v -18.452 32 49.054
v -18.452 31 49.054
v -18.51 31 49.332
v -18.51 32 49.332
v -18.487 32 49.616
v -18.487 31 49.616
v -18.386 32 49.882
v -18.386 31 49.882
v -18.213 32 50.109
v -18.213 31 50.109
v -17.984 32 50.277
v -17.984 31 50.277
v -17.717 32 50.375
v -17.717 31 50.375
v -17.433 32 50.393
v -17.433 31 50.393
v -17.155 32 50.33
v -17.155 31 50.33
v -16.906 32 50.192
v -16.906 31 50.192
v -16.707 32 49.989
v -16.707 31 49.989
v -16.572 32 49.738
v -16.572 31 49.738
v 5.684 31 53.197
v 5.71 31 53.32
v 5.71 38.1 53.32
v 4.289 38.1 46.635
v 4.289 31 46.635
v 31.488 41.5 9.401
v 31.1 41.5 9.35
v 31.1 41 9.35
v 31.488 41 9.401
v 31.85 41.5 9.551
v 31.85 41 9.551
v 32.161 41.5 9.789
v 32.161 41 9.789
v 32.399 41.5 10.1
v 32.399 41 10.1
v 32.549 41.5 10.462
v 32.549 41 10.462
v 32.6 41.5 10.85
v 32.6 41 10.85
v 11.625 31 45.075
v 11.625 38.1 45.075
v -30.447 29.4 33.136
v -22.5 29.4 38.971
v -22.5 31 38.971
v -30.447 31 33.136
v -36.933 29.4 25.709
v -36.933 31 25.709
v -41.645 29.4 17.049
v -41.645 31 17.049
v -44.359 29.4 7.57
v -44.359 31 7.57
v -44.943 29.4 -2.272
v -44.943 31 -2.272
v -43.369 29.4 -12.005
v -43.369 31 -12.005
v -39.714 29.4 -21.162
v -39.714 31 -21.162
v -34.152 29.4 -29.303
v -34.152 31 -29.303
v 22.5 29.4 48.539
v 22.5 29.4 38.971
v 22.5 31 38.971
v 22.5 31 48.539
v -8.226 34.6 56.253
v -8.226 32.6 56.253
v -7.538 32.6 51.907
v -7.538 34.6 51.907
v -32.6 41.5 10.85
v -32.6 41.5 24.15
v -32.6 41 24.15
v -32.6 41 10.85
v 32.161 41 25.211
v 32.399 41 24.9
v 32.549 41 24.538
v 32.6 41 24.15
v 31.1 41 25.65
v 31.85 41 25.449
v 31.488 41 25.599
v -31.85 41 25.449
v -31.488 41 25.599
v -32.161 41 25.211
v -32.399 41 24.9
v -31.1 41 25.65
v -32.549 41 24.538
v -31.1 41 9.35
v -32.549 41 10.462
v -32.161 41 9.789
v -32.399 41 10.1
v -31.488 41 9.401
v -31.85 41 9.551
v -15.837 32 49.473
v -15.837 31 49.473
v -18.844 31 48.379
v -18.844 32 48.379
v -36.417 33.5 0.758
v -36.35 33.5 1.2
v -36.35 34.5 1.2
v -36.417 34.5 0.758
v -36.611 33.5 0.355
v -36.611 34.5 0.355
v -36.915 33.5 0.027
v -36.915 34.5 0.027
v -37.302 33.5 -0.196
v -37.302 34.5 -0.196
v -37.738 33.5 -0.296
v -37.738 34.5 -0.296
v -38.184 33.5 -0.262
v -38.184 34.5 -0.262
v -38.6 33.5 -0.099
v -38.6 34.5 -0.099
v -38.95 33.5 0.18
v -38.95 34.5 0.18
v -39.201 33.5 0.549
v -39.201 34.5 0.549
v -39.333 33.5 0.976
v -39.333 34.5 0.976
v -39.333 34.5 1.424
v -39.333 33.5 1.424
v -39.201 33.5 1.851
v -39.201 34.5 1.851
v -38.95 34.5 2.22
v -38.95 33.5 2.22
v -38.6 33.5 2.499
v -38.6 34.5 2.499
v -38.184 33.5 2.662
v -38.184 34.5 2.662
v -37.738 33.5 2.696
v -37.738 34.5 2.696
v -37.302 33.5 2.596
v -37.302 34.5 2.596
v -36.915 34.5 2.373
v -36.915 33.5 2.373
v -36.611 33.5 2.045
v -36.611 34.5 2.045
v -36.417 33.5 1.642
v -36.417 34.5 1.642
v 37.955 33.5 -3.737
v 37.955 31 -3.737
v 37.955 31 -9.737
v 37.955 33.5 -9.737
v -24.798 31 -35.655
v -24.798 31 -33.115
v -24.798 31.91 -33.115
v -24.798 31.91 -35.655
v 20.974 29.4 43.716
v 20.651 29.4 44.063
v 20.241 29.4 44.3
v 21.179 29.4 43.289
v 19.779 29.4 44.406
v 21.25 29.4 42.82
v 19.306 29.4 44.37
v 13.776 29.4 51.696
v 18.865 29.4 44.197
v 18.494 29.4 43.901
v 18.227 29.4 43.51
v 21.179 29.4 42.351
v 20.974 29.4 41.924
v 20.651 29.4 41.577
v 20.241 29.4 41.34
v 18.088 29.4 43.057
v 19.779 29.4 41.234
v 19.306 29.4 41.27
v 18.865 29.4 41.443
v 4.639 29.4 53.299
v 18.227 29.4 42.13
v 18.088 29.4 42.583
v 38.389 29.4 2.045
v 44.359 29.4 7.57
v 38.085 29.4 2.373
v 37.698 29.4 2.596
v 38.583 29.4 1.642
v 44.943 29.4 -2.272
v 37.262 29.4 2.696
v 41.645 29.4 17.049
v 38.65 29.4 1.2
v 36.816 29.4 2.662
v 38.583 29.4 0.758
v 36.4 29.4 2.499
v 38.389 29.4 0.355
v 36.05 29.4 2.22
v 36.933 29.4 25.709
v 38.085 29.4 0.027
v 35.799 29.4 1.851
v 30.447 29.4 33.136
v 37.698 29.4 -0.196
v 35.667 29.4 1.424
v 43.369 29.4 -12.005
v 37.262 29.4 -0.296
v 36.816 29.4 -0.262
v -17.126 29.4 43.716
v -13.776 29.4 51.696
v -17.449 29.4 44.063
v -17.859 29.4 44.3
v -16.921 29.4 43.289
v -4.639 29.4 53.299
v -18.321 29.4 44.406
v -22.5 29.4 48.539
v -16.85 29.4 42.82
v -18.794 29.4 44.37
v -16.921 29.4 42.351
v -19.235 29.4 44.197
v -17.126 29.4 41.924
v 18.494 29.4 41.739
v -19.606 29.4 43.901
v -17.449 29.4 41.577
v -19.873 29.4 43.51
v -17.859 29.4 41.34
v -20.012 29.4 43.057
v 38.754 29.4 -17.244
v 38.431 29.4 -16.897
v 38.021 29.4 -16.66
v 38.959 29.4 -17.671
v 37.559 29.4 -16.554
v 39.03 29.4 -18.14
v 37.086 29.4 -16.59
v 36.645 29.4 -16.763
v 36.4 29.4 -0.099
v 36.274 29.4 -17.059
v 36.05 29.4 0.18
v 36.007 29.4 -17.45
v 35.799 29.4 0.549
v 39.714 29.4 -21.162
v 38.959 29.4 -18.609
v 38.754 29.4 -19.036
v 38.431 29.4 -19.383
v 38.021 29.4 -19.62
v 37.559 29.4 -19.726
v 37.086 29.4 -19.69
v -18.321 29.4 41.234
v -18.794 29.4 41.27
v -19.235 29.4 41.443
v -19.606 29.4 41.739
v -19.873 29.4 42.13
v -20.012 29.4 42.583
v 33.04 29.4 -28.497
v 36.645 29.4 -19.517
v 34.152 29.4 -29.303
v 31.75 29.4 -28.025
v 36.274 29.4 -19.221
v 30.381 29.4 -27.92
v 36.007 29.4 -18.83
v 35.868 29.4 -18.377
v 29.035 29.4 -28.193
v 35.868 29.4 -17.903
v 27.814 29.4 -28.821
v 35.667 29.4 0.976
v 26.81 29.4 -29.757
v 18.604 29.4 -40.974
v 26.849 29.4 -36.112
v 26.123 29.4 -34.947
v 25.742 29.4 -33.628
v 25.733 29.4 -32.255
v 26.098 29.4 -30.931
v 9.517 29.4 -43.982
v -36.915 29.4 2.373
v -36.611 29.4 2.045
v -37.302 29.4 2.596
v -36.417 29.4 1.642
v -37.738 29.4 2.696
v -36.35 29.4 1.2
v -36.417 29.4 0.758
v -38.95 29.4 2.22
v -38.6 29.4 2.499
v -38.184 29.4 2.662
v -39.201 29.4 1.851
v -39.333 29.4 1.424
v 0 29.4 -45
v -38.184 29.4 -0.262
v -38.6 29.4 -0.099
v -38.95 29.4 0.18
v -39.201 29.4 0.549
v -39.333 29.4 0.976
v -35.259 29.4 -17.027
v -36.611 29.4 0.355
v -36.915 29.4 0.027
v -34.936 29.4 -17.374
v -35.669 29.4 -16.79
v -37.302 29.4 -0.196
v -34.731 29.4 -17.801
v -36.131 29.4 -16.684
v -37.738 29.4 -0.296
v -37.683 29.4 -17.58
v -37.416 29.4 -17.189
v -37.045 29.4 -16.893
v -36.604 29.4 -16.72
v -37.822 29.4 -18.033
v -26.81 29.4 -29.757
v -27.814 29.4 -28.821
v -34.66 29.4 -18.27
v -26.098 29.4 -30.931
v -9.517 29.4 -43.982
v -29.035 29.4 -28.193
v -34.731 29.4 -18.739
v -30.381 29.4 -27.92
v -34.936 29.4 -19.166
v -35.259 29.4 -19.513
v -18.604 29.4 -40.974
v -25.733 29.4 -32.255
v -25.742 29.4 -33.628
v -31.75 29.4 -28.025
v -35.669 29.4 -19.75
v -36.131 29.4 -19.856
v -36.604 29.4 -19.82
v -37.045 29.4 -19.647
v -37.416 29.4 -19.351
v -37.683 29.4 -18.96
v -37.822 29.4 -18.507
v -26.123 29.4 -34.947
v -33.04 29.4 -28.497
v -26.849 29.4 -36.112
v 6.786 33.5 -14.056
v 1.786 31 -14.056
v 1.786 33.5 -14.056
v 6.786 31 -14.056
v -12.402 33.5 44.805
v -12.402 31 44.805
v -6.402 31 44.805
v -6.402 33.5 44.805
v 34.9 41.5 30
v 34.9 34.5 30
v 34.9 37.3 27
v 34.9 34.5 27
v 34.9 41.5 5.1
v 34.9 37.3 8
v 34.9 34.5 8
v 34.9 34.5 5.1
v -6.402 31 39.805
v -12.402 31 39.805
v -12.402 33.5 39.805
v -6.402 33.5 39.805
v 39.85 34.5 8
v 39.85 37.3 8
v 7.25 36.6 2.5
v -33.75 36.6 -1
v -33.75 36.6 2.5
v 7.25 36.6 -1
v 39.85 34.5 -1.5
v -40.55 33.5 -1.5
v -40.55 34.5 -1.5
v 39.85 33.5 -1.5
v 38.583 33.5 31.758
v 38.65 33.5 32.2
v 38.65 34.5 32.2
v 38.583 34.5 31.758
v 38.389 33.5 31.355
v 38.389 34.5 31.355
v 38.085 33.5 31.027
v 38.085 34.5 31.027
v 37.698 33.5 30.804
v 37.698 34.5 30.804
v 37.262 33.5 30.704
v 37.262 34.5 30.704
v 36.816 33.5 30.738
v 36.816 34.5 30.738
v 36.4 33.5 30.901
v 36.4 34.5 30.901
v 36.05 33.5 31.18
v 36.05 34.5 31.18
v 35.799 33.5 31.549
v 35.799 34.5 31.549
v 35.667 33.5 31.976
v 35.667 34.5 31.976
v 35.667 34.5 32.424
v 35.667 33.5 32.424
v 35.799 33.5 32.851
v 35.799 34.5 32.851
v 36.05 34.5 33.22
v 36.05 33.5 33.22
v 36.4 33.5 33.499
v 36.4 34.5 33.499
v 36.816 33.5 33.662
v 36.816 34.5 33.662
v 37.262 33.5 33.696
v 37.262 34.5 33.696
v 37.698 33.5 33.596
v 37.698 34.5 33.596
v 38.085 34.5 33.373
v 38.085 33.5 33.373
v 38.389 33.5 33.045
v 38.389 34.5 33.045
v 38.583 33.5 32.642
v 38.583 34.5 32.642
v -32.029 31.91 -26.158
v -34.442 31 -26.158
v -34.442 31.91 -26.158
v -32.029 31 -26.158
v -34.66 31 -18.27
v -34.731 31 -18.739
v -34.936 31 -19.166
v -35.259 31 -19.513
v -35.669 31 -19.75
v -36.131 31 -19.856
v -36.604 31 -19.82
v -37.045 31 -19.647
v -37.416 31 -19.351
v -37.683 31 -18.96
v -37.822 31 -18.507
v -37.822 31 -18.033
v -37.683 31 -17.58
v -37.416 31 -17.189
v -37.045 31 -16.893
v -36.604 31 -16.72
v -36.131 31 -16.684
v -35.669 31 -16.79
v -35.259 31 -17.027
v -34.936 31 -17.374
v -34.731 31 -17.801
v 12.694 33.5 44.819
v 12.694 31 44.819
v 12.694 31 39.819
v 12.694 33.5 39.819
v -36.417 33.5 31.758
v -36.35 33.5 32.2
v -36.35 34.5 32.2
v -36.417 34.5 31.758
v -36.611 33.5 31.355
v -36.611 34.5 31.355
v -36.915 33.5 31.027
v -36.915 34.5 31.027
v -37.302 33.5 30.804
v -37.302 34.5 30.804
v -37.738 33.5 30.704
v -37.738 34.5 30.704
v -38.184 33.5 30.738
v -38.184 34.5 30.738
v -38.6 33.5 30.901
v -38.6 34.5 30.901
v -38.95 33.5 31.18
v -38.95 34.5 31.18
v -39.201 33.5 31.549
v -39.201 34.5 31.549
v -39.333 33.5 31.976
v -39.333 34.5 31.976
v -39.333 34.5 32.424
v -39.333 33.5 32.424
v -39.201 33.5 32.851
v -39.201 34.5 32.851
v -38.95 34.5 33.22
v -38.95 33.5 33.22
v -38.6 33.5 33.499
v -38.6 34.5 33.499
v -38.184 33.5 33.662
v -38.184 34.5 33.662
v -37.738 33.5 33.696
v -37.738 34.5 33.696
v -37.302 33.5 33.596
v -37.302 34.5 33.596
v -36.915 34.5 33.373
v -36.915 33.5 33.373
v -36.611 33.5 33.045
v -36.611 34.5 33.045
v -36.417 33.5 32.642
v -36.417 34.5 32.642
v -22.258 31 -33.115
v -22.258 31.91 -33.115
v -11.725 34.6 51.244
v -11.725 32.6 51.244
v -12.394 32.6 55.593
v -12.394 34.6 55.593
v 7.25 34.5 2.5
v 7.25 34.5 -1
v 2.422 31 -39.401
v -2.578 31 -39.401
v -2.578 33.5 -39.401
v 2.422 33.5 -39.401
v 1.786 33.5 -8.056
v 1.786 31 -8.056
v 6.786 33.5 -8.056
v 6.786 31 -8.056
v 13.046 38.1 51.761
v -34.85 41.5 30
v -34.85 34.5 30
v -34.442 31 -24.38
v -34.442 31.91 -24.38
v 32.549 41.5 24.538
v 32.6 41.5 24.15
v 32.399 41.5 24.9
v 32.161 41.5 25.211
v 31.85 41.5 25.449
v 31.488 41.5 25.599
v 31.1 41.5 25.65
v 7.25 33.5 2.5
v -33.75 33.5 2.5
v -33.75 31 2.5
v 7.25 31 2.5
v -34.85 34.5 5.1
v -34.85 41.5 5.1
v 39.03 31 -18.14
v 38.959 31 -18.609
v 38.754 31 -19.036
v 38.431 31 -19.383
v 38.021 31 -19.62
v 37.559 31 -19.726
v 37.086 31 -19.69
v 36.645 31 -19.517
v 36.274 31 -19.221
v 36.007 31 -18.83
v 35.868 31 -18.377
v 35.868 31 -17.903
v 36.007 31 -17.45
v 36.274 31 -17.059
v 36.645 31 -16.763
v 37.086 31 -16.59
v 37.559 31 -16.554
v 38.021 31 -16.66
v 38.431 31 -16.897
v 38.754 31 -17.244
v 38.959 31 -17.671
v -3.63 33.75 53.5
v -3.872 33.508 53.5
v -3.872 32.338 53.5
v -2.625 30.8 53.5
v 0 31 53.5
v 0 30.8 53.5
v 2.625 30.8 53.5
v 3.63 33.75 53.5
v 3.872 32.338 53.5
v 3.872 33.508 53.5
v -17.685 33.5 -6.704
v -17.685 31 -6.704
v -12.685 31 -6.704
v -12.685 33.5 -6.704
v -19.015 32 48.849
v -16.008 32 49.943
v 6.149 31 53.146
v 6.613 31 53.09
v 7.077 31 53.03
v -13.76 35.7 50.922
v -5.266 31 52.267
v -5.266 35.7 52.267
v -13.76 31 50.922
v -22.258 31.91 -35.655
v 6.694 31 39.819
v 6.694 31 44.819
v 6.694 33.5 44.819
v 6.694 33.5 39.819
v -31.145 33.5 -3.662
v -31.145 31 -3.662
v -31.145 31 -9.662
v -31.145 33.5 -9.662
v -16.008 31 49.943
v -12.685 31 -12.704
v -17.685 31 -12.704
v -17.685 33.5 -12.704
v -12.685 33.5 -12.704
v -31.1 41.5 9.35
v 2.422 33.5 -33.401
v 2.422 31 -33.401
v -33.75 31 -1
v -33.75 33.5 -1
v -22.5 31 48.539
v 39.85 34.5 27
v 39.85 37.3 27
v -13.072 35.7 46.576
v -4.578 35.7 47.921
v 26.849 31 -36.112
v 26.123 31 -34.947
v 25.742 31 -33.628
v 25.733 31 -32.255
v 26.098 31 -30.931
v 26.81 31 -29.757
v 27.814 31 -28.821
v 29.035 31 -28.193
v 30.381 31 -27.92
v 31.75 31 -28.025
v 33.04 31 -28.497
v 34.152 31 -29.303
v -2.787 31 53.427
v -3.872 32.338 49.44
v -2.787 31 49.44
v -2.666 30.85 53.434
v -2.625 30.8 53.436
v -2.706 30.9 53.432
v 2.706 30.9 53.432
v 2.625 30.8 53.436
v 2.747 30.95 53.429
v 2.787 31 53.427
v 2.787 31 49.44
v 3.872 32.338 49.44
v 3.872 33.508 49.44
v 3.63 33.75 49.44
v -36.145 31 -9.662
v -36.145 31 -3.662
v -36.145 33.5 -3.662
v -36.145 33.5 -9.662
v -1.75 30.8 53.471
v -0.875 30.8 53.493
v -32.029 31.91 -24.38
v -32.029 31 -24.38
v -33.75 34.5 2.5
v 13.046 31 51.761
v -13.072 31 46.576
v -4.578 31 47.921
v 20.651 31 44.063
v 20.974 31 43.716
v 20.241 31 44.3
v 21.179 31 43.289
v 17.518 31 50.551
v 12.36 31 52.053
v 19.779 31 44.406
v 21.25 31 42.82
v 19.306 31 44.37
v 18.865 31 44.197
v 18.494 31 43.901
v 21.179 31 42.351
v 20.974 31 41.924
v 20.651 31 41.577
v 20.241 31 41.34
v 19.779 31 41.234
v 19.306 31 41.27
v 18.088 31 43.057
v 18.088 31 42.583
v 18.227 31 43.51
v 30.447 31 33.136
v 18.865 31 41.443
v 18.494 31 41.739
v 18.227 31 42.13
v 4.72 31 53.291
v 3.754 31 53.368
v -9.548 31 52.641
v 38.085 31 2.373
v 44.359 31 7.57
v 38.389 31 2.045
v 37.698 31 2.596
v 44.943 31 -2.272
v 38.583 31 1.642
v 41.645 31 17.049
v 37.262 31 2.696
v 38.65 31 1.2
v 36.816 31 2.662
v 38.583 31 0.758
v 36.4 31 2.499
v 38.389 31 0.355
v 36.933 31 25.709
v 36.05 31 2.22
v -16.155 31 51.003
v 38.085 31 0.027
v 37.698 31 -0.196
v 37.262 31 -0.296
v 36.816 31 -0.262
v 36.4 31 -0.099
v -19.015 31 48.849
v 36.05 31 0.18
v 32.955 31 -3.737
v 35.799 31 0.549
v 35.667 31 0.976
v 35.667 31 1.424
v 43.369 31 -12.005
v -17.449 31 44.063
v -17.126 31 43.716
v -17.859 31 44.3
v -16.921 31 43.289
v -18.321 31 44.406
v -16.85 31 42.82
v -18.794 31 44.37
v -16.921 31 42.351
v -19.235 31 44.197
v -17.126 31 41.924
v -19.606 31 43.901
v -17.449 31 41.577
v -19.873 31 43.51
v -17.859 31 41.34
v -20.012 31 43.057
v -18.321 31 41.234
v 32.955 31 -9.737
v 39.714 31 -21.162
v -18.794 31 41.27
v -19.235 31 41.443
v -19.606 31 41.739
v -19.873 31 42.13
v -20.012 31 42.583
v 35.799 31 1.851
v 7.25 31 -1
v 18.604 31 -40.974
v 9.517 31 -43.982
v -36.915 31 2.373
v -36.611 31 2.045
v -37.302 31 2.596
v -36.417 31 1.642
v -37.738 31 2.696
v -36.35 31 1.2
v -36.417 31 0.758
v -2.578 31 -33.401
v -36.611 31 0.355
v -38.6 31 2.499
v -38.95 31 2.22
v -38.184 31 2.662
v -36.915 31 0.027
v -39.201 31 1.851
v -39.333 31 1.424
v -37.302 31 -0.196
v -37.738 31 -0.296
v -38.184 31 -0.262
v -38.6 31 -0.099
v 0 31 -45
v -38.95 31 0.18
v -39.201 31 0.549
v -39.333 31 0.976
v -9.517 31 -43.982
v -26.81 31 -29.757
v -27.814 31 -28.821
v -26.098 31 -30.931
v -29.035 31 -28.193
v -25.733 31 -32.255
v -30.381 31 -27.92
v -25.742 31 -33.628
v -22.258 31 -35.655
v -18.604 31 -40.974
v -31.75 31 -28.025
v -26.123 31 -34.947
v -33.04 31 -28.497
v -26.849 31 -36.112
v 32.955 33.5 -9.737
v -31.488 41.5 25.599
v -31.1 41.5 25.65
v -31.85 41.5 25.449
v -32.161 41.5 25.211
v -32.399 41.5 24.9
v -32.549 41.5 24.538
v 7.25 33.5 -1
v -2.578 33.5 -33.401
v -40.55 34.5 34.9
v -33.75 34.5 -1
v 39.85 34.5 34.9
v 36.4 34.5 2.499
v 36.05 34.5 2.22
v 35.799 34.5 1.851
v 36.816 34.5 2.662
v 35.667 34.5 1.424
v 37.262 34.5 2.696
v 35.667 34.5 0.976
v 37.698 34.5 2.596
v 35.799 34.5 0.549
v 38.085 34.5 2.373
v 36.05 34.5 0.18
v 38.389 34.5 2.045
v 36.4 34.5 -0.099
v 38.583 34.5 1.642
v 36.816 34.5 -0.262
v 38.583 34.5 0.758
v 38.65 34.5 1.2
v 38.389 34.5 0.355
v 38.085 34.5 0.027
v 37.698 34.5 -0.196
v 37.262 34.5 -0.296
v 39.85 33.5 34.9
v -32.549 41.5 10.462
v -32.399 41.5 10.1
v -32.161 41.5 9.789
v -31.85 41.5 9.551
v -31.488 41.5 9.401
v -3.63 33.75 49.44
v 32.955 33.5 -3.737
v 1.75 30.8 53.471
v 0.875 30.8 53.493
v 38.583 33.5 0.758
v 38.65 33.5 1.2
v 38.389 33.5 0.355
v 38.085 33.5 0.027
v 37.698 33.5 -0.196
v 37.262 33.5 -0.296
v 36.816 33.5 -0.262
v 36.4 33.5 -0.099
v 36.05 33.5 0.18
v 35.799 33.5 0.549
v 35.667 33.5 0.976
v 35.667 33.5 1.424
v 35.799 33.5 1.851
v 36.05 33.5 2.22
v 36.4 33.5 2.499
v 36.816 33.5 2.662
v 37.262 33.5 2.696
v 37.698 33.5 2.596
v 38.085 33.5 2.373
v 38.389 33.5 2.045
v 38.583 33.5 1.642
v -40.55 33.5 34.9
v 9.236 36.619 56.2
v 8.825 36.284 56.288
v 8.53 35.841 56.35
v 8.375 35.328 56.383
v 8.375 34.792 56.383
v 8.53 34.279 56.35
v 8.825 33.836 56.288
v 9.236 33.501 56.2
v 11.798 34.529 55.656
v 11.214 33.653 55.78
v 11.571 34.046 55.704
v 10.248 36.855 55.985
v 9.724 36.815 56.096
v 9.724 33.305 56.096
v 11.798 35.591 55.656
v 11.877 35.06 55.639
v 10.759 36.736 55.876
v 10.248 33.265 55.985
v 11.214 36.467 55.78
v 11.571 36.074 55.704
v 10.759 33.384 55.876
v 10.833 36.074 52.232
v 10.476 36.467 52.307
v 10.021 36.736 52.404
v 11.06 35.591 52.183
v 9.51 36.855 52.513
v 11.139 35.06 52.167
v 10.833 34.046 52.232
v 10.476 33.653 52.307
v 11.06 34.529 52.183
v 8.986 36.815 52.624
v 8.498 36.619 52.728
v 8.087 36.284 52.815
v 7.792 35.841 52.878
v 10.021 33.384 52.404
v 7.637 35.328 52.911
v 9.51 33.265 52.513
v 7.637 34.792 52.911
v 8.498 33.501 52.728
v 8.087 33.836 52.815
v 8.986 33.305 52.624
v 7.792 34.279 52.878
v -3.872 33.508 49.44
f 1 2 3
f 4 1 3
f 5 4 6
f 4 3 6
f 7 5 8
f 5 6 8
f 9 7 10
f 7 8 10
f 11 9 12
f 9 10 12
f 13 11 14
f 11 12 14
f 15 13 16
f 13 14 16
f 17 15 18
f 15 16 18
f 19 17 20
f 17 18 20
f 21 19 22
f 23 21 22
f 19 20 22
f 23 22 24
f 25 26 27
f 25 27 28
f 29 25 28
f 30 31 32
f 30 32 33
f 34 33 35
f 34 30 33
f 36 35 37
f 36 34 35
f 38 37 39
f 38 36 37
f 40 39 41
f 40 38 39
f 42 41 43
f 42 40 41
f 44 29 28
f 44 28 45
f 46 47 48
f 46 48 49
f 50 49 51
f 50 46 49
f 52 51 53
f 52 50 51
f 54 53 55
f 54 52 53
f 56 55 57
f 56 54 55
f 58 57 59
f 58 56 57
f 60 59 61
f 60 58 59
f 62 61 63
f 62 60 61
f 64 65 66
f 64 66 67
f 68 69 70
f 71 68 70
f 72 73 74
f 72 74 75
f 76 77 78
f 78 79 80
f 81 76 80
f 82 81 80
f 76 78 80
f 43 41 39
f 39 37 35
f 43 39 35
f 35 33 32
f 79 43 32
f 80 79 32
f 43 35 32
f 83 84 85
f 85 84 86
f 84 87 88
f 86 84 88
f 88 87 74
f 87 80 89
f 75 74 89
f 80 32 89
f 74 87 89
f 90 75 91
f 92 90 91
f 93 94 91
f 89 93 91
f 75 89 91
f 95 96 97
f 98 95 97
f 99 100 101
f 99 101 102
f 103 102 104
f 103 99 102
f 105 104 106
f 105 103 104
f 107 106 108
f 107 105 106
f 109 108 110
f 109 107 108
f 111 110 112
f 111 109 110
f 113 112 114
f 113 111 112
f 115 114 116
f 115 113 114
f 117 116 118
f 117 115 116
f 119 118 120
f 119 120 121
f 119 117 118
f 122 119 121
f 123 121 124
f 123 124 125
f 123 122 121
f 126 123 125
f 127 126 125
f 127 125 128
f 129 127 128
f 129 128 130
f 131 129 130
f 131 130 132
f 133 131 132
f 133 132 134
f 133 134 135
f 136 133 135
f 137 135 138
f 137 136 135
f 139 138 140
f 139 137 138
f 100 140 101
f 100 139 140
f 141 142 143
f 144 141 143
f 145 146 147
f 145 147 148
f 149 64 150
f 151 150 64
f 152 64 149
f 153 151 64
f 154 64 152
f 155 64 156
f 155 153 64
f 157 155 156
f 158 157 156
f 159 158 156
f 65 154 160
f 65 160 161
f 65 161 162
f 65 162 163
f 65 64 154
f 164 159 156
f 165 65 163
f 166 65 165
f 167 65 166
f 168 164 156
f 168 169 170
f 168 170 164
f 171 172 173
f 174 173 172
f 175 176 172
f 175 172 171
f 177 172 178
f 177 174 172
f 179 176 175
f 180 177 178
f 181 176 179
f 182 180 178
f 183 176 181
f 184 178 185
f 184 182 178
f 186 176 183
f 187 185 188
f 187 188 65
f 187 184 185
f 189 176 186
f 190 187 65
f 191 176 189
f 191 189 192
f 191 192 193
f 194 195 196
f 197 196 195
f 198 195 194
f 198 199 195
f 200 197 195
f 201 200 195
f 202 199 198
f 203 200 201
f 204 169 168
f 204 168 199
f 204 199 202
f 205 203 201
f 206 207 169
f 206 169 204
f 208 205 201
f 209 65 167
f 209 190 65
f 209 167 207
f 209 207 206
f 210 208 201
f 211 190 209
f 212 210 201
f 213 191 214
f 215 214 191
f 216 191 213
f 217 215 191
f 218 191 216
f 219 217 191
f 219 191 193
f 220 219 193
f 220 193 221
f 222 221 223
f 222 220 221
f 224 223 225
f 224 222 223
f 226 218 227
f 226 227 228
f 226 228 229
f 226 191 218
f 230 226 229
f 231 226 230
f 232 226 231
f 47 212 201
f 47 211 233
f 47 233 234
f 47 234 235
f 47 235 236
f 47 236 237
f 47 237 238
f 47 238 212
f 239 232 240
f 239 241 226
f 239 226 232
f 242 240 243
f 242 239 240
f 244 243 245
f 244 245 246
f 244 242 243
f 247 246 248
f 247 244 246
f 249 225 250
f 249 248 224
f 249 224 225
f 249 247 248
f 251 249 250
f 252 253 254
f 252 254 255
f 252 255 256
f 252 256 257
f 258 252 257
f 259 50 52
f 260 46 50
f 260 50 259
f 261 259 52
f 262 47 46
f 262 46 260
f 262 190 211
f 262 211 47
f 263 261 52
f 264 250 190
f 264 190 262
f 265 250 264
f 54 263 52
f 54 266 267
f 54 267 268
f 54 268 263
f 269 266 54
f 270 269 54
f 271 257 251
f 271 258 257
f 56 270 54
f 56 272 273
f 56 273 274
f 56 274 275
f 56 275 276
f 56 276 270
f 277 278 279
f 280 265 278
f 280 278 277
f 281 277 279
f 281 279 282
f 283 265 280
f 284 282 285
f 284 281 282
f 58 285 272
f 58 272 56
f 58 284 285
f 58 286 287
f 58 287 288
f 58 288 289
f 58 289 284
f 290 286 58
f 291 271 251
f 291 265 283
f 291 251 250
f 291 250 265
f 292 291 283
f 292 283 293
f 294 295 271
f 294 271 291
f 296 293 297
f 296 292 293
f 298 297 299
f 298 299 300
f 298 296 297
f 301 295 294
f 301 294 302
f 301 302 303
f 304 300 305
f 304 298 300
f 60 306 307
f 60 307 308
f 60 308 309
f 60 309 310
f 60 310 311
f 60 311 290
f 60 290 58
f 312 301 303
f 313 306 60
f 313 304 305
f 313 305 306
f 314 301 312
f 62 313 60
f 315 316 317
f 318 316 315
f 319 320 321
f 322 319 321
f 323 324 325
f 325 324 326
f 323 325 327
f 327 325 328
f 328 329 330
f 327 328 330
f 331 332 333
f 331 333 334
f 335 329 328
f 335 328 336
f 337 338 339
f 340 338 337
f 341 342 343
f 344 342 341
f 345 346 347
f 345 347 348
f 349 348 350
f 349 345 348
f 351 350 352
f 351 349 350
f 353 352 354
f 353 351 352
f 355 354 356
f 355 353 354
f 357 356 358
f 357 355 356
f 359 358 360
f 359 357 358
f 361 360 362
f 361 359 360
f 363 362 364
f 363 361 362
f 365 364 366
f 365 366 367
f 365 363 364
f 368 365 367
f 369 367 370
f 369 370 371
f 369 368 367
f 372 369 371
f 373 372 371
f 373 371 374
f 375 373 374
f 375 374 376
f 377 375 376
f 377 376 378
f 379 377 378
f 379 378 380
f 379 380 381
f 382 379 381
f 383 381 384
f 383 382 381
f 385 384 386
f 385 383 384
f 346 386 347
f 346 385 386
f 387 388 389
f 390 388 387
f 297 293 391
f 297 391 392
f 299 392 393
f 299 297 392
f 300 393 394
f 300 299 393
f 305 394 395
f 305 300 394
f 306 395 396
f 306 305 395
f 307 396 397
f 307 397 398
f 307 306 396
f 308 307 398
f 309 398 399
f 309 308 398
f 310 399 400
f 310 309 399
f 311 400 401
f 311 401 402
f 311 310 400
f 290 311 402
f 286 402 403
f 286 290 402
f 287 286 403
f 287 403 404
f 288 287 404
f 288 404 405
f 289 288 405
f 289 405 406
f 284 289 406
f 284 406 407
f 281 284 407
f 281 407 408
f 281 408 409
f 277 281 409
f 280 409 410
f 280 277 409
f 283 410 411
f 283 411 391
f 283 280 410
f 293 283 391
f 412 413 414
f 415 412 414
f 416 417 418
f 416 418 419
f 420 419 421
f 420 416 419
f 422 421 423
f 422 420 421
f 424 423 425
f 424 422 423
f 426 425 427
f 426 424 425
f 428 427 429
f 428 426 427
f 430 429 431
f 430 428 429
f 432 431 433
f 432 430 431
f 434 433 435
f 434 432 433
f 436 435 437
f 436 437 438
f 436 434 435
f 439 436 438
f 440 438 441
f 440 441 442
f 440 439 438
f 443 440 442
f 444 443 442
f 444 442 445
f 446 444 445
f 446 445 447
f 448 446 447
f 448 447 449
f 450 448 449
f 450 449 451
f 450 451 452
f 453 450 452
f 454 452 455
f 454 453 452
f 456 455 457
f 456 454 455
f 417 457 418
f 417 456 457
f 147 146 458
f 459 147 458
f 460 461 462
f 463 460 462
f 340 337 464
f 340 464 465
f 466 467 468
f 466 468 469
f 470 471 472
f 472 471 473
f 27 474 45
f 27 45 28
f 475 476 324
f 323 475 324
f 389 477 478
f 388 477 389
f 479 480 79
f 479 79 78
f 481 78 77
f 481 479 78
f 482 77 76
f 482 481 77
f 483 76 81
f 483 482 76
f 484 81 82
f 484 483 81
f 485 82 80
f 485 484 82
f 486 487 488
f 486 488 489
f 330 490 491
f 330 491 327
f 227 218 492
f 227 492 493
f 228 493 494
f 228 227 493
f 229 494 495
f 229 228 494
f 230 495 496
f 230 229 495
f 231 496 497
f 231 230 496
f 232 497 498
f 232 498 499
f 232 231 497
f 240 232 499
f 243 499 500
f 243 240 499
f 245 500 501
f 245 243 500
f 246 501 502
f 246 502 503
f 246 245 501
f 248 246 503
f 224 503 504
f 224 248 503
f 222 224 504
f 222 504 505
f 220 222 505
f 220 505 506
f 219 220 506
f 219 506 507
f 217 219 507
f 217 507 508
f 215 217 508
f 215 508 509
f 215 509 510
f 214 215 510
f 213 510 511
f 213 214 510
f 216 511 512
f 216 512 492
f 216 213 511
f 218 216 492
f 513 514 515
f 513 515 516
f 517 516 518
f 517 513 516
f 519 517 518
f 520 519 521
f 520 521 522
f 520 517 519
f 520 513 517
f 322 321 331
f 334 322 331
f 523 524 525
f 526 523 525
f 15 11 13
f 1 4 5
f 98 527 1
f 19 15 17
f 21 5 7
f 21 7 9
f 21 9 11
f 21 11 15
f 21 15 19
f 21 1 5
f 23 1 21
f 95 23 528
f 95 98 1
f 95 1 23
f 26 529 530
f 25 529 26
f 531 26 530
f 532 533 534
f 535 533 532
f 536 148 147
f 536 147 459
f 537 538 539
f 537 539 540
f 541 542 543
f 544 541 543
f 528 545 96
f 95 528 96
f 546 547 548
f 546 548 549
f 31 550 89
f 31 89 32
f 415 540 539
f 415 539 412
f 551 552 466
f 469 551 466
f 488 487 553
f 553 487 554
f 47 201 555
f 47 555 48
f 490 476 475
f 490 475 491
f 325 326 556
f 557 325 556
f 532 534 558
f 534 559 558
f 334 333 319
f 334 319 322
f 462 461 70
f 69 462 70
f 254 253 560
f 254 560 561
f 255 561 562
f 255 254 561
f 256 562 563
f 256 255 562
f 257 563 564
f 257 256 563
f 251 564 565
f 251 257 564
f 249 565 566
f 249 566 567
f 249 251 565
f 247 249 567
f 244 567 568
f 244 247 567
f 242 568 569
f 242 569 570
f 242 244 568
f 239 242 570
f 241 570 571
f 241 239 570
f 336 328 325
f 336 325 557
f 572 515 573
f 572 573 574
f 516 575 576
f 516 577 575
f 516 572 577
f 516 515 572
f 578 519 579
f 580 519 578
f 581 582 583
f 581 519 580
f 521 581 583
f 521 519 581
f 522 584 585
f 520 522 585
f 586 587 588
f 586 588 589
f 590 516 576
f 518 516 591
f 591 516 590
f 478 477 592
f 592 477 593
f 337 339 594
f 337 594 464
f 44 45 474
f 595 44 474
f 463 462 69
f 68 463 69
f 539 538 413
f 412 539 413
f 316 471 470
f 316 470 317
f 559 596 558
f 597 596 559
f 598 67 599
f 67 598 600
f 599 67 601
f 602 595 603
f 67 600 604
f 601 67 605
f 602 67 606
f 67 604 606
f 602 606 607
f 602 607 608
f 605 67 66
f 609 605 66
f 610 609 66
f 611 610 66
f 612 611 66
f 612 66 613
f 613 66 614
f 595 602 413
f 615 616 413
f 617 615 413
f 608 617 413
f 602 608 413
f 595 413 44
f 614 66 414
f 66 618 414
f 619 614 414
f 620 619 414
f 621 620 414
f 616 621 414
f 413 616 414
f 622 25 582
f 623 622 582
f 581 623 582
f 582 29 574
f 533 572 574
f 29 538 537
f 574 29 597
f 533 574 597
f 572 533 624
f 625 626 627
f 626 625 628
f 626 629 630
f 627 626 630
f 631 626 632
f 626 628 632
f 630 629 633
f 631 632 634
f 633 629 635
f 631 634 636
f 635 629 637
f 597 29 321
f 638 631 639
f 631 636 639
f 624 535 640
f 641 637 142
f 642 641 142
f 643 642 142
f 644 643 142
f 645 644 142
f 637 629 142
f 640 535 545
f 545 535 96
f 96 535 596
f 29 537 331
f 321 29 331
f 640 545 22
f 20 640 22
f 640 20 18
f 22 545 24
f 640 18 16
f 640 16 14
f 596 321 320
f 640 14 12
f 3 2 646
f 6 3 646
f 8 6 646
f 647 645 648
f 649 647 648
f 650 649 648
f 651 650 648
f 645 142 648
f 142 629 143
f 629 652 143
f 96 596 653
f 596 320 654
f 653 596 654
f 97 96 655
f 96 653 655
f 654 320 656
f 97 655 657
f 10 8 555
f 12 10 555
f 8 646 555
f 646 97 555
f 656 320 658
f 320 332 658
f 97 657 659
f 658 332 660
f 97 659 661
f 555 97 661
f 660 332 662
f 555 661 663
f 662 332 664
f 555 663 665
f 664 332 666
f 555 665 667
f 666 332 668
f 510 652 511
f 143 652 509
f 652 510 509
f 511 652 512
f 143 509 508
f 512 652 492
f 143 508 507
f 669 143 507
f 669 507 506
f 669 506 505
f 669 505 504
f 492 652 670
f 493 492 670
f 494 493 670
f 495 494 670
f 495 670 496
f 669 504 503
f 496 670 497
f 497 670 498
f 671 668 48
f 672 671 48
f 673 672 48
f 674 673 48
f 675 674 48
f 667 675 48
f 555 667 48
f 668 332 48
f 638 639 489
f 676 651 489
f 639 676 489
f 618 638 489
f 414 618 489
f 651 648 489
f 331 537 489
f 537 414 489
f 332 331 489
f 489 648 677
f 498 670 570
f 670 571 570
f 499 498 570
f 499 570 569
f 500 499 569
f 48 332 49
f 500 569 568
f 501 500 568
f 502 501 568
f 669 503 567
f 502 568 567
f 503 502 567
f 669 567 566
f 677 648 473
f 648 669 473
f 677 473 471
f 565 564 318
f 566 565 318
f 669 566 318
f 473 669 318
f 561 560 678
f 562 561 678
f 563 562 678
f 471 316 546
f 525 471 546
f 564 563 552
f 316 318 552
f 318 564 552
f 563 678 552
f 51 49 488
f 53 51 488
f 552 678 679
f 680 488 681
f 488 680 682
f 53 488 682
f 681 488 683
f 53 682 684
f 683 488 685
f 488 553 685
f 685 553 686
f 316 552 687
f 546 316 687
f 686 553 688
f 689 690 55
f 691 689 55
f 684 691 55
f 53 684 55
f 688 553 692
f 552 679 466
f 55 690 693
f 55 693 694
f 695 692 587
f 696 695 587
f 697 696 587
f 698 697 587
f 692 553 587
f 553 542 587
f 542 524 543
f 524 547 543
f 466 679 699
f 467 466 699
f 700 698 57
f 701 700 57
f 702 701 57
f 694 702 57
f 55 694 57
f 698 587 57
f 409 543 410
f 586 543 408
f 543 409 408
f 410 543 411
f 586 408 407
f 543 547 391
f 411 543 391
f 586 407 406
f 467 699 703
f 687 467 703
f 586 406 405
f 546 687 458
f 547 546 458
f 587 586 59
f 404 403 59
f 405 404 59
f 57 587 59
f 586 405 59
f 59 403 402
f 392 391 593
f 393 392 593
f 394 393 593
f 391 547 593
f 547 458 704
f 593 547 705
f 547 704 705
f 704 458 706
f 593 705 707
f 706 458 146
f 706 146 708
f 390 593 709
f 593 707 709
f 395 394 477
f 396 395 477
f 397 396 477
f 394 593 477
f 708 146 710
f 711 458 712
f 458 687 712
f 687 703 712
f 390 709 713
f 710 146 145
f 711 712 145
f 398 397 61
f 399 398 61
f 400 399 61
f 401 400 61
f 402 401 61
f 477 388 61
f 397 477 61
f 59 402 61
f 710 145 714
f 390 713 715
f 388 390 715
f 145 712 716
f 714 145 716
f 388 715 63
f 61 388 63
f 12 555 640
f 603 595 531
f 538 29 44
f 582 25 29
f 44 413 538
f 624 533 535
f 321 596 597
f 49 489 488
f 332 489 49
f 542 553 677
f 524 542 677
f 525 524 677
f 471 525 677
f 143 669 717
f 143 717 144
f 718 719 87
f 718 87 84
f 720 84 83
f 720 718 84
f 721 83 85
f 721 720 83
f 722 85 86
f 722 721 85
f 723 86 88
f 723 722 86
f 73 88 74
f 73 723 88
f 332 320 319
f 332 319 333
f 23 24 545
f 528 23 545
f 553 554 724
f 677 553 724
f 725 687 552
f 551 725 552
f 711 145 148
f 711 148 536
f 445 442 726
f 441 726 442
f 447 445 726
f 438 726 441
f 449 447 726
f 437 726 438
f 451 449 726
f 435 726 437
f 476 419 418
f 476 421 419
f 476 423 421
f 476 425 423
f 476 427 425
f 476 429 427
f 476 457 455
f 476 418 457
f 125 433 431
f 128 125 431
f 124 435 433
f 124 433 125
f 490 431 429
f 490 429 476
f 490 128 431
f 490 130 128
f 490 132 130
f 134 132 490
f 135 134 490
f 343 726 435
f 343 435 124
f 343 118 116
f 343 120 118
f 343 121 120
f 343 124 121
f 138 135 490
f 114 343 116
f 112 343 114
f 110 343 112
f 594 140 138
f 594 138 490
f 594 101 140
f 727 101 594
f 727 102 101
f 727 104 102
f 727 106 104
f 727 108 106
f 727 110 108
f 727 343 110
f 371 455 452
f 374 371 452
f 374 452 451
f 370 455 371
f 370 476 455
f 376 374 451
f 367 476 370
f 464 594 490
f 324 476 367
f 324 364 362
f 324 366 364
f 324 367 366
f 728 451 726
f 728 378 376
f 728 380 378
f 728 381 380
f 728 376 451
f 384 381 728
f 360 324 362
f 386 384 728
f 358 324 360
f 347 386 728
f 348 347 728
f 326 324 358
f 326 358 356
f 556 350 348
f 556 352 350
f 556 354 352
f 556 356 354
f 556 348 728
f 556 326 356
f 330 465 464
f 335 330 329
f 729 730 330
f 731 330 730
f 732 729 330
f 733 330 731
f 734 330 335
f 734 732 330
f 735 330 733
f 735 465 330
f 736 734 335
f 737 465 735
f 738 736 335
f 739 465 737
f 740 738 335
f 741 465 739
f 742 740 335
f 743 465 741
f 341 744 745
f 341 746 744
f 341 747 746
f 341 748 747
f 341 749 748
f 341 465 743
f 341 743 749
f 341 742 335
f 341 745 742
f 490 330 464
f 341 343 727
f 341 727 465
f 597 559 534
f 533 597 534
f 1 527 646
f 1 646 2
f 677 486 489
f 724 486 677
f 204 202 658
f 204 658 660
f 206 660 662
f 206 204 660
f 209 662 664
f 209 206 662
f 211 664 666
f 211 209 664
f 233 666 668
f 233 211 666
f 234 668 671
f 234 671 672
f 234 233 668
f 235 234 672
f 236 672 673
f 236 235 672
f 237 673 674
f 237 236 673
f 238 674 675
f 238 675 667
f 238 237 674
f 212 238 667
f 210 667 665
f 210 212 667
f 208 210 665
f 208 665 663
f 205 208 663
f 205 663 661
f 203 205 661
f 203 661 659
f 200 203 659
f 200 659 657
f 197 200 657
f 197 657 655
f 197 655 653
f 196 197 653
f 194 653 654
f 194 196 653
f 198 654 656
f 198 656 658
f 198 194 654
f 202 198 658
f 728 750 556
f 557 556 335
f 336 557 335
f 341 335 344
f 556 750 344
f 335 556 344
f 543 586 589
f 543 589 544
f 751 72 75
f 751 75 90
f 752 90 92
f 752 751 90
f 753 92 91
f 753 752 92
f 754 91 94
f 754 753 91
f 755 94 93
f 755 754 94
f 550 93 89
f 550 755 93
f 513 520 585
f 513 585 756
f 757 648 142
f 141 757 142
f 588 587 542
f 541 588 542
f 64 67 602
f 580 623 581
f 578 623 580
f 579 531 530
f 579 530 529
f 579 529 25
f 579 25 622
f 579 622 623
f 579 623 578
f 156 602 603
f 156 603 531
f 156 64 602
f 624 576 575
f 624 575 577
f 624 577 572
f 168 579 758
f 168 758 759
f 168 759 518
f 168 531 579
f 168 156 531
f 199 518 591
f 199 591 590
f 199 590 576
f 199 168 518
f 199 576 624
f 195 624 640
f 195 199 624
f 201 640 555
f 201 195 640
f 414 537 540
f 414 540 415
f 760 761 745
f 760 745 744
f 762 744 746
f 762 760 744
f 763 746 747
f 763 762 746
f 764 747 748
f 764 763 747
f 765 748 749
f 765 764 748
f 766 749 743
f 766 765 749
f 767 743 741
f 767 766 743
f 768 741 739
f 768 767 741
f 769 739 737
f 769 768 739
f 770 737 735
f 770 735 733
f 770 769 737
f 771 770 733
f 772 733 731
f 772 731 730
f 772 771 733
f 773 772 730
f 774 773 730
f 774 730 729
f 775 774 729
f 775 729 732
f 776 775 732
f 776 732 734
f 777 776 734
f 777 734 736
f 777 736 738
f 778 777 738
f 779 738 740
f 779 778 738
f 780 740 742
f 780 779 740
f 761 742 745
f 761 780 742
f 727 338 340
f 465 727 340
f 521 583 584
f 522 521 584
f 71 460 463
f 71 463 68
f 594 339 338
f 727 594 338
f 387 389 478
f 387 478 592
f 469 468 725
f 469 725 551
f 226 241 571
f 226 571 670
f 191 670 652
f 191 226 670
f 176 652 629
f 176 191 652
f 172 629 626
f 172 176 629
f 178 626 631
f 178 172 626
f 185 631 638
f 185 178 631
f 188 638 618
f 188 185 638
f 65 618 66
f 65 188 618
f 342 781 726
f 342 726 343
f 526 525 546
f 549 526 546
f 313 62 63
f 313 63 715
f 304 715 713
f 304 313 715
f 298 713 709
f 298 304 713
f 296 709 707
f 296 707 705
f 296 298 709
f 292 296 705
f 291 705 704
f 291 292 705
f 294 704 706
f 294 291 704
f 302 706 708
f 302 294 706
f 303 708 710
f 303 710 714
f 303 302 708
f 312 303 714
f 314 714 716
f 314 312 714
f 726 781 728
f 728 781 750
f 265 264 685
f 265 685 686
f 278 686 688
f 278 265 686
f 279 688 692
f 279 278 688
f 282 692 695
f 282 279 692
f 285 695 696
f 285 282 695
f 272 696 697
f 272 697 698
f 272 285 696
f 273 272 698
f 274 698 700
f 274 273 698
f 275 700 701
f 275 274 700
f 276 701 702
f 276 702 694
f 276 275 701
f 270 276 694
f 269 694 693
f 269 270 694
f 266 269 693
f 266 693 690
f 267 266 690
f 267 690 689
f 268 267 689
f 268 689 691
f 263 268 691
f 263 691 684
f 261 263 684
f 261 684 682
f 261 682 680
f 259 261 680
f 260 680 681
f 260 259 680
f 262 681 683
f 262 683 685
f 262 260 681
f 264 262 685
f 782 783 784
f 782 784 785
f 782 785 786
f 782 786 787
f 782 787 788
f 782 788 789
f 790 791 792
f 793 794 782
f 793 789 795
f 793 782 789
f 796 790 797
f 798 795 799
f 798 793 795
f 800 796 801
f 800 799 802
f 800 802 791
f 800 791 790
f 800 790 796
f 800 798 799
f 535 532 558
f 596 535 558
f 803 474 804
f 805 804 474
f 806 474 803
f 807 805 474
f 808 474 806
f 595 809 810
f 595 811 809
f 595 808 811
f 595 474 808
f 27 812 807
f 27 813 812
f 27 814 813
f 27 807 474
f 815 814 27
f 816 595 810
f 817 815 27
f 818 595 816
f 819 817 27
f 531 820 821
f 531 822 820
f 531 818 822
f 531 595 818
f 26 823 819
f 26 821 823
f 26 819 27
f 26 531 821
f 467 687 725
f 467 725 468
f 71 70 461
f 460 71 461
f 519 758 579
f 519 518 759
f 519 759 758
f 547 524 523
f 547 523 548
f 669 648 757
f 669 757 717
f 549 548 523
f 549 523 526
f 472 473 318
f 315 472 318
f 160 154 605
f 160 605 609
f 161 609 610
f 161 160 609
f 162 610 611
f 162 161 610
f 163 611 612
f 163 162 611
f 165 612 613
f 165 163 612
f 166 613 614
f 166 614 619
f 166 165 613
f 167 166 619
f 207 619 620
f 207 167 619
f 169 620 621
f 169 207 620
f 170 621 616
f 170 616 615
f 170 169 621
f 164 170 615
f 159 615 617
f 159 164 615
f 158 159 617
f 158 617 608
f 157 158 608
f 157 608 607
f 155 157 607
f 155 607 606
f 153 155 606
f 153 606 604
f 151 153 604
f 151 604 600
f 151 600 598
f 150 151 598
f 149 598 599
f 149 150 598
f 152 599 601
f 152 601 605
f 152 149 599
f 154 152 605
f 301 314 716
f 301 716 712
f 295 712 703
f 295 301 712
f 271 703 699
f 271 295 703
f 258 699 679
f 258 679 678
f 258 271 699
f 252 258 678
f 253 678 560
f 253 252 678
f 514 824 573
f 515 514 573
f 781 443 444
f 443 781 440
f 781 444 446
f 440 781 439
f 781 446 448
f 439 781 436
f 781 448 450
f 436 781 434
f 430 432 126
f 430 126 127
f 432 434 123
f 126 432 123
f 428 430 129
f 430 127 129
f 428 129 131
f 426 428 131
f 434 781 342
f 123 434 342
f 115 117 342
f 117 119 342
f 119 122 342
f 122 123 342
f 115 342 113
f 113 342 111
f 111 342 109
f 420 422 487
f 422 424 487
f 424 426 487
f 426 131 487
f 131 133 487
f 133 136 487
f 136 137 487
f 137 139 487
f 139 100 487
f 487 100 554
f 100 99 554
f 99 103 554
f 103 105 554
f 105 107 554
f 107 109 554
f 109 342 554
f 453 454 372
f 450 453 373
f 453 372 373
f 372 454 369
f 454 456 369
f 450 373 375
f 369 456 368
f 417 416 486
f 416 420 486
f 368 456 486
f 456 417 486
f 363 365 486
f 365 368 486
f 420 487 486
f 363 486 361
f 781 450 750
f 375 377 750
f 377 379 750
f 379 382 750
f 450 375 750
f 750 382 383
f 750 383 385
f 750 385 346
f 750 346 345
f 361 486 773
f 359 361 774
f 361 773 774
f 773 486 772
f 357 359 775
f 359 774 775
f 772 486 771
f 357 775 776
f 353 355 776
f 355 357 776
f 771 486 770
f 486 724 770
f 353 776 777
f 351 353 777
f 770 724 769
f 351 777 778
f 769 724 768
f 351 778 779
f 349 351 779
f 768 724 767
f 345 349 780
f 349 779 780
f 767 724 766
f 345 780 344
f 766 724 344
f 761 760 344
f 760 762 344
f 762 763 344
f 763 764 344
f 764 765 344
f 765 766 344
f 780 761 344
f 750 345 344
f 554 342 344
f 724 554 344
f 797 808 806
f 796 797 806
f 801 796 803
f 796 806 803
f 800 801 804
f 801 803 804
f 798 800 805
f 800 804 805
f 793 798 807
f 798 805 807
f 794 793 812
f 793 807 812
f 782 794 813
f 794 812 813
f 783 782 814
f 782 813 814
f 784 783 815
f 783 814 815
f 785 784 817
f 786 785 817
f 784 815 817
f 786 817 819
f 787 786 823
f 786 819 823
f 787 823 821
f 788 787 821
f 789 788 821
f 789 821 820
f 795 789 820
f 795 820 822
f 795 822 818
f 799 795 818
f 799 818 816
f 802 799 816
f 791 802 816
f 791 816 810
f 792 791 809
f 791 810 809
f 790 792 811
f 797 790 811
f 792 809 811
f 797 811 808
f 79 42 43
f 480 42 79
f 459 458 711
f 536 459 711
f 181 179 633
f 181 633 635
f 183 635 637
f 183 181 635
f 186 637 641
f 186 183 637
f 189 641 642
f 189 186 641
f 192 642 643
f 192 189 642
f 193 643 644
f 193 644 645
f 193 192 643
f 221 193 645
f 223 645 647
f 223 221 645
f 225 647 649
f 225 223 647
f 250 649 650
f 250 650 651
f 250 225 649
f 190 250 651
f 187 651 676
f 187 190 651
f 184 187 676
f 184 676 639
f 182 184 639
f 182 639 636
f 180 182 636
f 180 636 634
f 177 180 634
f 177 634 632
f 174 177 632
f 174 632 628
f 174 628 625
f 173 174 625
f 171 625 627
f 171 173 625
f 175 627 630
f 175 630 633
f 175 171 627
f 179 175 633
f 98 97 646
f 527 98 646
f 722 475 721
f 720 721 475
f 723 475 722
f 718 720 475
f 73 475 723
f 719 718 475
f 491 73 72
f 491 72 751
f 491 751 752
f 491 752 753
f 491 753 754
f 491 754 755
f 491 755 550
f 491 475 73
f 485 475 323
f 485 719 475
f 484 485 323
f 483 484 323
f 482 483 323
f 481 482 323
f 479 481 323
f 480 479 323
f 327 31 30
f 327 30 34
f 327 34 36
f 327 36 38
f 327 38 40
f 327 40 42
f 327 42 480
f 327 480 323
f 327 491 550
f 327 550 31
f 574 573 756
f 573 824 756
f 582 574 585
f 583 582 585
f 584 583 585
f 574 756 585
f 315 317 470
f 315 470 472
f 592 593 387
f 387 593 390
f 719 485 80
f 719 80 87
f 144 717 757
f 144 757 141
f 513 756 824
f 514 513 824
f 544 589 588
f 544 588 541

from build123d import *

# Parameters (mm, degrees)
BOSS_EXTRUDE_START                   = 29.4
PCB_AREA_R                           = 1.5
PCB_AREA_R_2                         = 1.59
BOSS_EXTRUDE_PCB_DEPTH               = 1.6
BOSS_EXTRUDE_START_2                 = 33.5
LCD_AREA_W                           = 80.4
LCD_AREA_H                           = 36.4
LCD_AREA_R                           = 1.5
BOSS_EXTRUDE_LCD_PCB_DEPTH           = 1
BOSS_EXTRUDE_START_3                 = 36.6
LCD_AREA_3_W                         = 41
LCD_AREA_3_H                         = 3.5
BOSS_EXTRUDE_LCD_HEADER_DEPTH        = 5.6
BOSS_EXTRUDE_START_4                 = 34.5
LCD_AREA_4_W                         = 4.95
LCD_AREA_4_H                         = 19
BOSS_EXTRUDE_LCD_BACKLIGHT_DEPTH     = 2.8
LCD_AREA_5_W                         = 69.75
LCD_AREA_5_H                         = 24.9
BOSS_EXTRUDE_LCD_CASING_DEPTH        = 7
CUT_EXTRUDE_START                    = 41.5
CUT_EXTRUDE_LCD_SCREEN_DEPTH         = 0.5
BOSS_EXTRUDE_START_5                 = 31
PCB_COMPONENTS_3_W                   = 5.00000016
PCB_COMPONENTS_3_H                   = 6.0000007
PCB_COMPONENTS_3_W_2                 = 6.0000007
PCB_COMPONENTS_3_H_2                 = 5.00000016
BOSS_EXTRUDE_LEDS_DEPTH              = 2.5
BOSS_EXTRUDE_CHARGING_LED_DEPTH      = 1
PCB_COMPONENTS_5_W                   = 2.413
PCB_COMPONENTS_5_H                   = 1.778
BOSS_EXTRUDE_LIGHT_SENSOR_DEPTH      = 0.91
PCB_COMPONENTS_6_W                   = 2.54
PCB_COMPONENTS_6_H                   = 2.54
BOSS_EXTRUDE_TEMP_SENSOR_DEPTH       = 0.91
BOSS_EXTRUDE_POWER_SWITCH_BASE_DEPTH = 4.7
BOSS_EXTRUDE_START_6                 = 32.6
BOSS_EXTRUDE_POWER_SWITCH_DEPTH      = 2
BOSS_EXTRUDE_START_7                 = 53.5
BOSS_EXTRUDE_USB_CONNECTOR_DEPTH     = 4.06
BOSS_EXTRUDE_BUTTON_BASE_DEPTH       = 7.1
BUTTON_CIRCLE_R                      = 1.8
BOSS_EXTRUDE_BUTTON_DEPTH            = 3.55


with BuildPart() as part:
    # PCB area → Boss-Extrude PCB (new body)
    with BuildSketch(Plane(origin=(0, 0, 0), x_dir=(1, 0, 0), z_dir=(0, 1, 0)).offset(BOSS_EXTRUDE_START)):
        with BuildLine():
            Line((-22.5, -48.538644398), (-22.5, -38.97114317))
            ThreePointArc((-22.5, -38.97114317), (-44.358674104, -7.570206849), (-34.1516032, 29.303037366))
            ThreePointArc((-34.1516032, 29.303037366), (-27.279934403, 29.254148065), (-26.849361228, 36.112488167))
            ThreePointArc((-26.849361228, 36.112488167), (0, 45), (26.849361228, 36.112488167))
            ThreePointArc((26.849361228, 36.112488167), (27.279934402, 29.254148065), (34.1516032, 29.303037366))
            ThreePointArc((34.1516032, 29.303037366), (44.358674104, -7.570206849), (22.5, -38.97114317))
            Line((22.5, -38.97114317), (22.5, -48.538644398))
            ThreePointArc((22.5, -48.538644398), (0, -53.5), (-22.5, -48.538644398))
        make_face()
        with Locations((-37.85, -1.2)):
            Circle(PCB_AREA_R, mode=Mode.SUBTRACT)
        with Locations((37.15, -1.2)):
            Circle(PCB_AREA_R, mode=Mode.SUBTRACT)
        with Locations((-18.44, -42.82)):
            Circle(PCB_AREA_R_2, mode=Mode.SUBTRACT)
        with Locations((19.66, -42.82)):
            Circle(PCB_AREA_R_2, mode=Mode.SUBTRACT)
        with Locations((-36.25, 18.27)):
            Circle(PCB_AREA_R_2, mode=Mode.SUBTRACT)
        with Locations((37.44, 18.14)):
            Circle(PCB_AREA_R_2, mode=Mode.SUBTRACT)
    extrude(amount=BOSS_EXTRUDE_PCB_DEPTH)



with BuildPart() as body_2:
    # LCD area → Boss-Extrude LCD PCB (new body)
    with BuildSketch(Plane(origin=(0, 0, 0), x_dir=(1, 0, 0), z_dir=(0, 1, 0)).offset(BOSS_EXTRUDE_START_2)):
        with Locations((-0.35, -16.7)):
            Rectangle(LCD_AREA_W, LCD_AREA_H)
        with Locations((-37.85, -1.2)):
            Circle(LCD_AREA_R, mode=Mode.SUBTRACT)
        with Locations((37.15, -1.2)):
            Circle(LCD_AREA_R, mode=Mode.SUBTRACT)
        with Locations((37.15, -32.2)):
            Circle(LCD_AREA_R, mode=Mode.SUBTRACT)
        with Locations((-37.85, -32.2)):
            Circle(LCD_AREA_R, mode=Mode.SUBTRACT)
    extrude(amount=BOSS_EXTRUDE_LCD_PCB_DEPTH)


with BuildPart() as part_1:
    add(part.part)

    add(body_2.part)  # Boss-Extrude LCD header merges body 2
    # LCD area<3> → Boss-Extrude LCD header (add)
    with BuildSketch(Plane(origin=(0, 0, 0), x_dir=(1, 0, 0), z_dir=(0, 1, 0)).offset(BOSS_EXTRUDE_START_3)):
        with Locations((-13.25, -0.75)):
            Rectangle(LCD_AREA_3_W, LCD_AREA_3_H)
    extrude(amount=-BOSS_EXTRUDE_LCD_HEADER_DEPTH)

    # LCD area<4> → Boss-Extrude LCD backlight (add)
    with BuildSketch(Plane(origin=(0, 0, 0), x_dir=(1, 0, 0), z_dir=(0, 1, 0)).offset(BOSS_EXTRUDE_START_4)):
        with Locations((37.375, -17.5)):
            Rectangle(LCD_AREA_4_W, LCD_AREA_4_H)
    extrude(amount=BOSS_EXTRUDE_LCD_BACKLIGHT_DEPTH)

    # LCD area<5> → Boss-Extrude LCD casing (add)
    with BuildSketch(Plane(origin=(0, 0, 0), x_dir=(1, 0, 0), z_dir=(0, 1, 0)).offset(BOSS_EXTRUDE_START_4)):
        with Locations((0.025, -17.55)):
            Rectangle(LCD_AREA_5_W, LCD_AREA_5_H)
    extrude(amount=BOSS_EXTRUDE_LCD_CASING_DEPTH)

    # LCD area<6> → Cut-Extrude LCD screen (cut)
    with BuildSketch(Plane(origin=(0, 0, 0), x_dir=(1, 0, 0), z_dir=(0, 1, 0)).offset(CUT_EXTRUDE_START)):
        with BuildLine():
            Line((31.1, -25.65), (-31.1, -25.65))
            ThreePointArc((-31.1, -25.65), (-32.160660172, -25.210660172), (-32.6, -24.15))
            Line((-32.6, -24.15), (-32.6, -10.85))
            ThreePointArc((-32.6, -10.85), (-32.160660172, -9.789339828), (-31.1, -9.35))
            Line((-31.1, -9.35), (31.1, -9.35))
            ThreePointArc((31.1, -9.35), (32.160660172, -9.789339828), (32.6, -10.85))
            Line((32.6, -10.85), (32.6, -24.15))
            ThreePointArc((32.6, -24.15), (32.160660172, -25.210660172), (31.1, -25.65))
        make_face()
    extrude(amount=-CUT_EXTRUDE_LCD_SCREEN_DEPTH, mode=Mode.SUBTRACT)

    # PCB components<3> → Boss-Extrude LEDs (add)
    with BuildSketch(Plane(origin=(0, 0, 0), x_dir=(1, 0, 0), z_dir=(0, 1, 0)).offset(BOSS_EXTRUDE_START_5)):
        with Locations((-33.64490509, 6.662364904)):
            Rectangle(PCB_COMPONENTS_3_W, PCB_COMPONENTS_3_H)
        with Locations((-9.402413685, -42.304616346)):
            Rectangle(PCB_COMPONENTS_3_W_2, PCB_COMPONENTS_3_H_2)
        with Locations((9.693556469, -42.318837537)):
            Rectangle(PCB_COMPONENTS_3_W_2, PCB_COMPONENTS_3_H_2)
        with Locations((-15.185287476, 9.703655188)):
            Rectangle(PCB_COMPONENTS_3_W, PCB_COMPONENTS_3_H)
        with Locations((4.286094666, 11.05569071)):
            Rectangle(PCB_COMPONENTS_3_W, PCB_COMPONENTS_3_H)
        with Locations((35.455097198, 6.737369482)):
            Rectangle(PCB_COMPONENTS_3_W, PCB_COMPONENTS_3_H)
        with Locations((-0.07787323, 36.401340429)):
            Rectangle(PCB_COMPONENTS_3_W, PCB_COMPONENTS_3_H)
    extrude(amount=BOSS_EXTRUDE_LEDS_DEPTH)

    # PCB components → Boss-Extrude charging LED (add)
    with BuildSketch(Plane(origin=(0, 0, 0), x_dir=(1, 0, 0), z_dir=(0, 1, 0)).offset(BOSS_EXTRUDE_START_5)):
        with BuildLine():
            Line((-19.015338568, -48.848593014), (-18.451523006, -49.053805147))
            ThreePointArc((-18.451523006, -49.053805147), (-17.853850615, -50.335517952), (-16.572137811, -49.737845561))
            Line((-16.572137811, -49.737845561), (-16.008322255, -49.943057676))
            Line((-16.008322255, -49.943057676), (-15.837312152, -49.473211377))
            Line((-15.837312152, -49.473211377), (-18.844328464, -48.378746715))
            Line((-18.844328464, -48.378746715), (-19.015338568, -48.848593014))
        make_face()
    extrude(amount=BOSS_EXTRUDE_CHARGING_LED_DEPTH)

    # PCB components<5> → Boss-Extrude light sensor (add)
    with BuildSketch(Plane(origin=(0, 0, 0), x_dir=(1, 0, 0), z_dir=(0, 1, 0)).offset(BOSS_EXTRUDE_START_5)):
        with Locations((-33.235496521, 25.269289599)):
            Rectangle(PCB_COMPONENTS_5_W, PCB_COMPONENTS_5_H)
    extrude(amount=BOSS_EXTRUDE_LIGHT_SENSOR_DEPTH)

    # PCB components<6> → Boss-Extrude temp sensor (add)
    with BuildSketch(Plane(origin=(0, 0, 0), x_dir=(1, 0, 0), z_dir=(0, 1, 0)).offset(BOSS_EXTRUDE_START_5)):
        with Locations((-23.527870178, 34.385096178)):
            Rectangle(PCB_COMPONENTS_6_W, PCB_COMPONENTS_6_H)
    extrude(amount=BOSS_EXTRUDE_TEMP_SENSOR_DEPTH)

    # PCB components<7> → Boss-Extrude power switch base (add)
    with BuildSketch(Plane(origin=(0, 0, 0), x_dir=(1, 0, 0), z_dir=(0, 1, 0)).offset(BOSS_EXTRUDE_START_5)):
        Polygon((-5.265972545, -52.267218464), (-13.760092303, -50.921882249), (-13.071780751, -46.576053535), (-4.577660993, -47.92138975), align=None)
    extrude(amount=BOSS_EXTRUDE_POWER_SWITCH_BASE_DEPTH)

    # PCB height map → Boss-Extrude USB connector (add)
    with BuildSketch(Plane.XY.offset(BOSS_EXTRUDE_START_7)):
        Polygon((-2.625, 30.8), (2.625, 30.8), (3.872091094, 32.337908906), (3.872091094, 33.507908906), (3.63, 33.75), (-3.63, 33.75), (-3.872091094, 33.507908906), (-3.872091094, 32.337908906), align=None)
    extrude(amount=-BOSS_EXTRUDE_USB_CONNECTOR_DEPTH)

    # PCB components<9> → Boss-Extrude button base (add)
    with BuildSketch(Plane(origin=(0, 0, 0), x_dir=(1, 0, 0), z_dir=(0, 1, 0)).offset(BOSS_EXTRUDE_START_5)):
        Polygon((4.288833513, -46.634785586), (11.624940357, -45.075447145), (13.046016326, -51.761080528), (5.709909482, -53.320418969), align=None)
    extrude(amount=BOSS_EXTRUDE_BUTTON_BASE_DEPTH)

    # Button circle → Boss-Extrude button (add)
    with BuildSketch(Plane(origin=(11.090513202, 0, 52.17673576), x_dir=(0.978147579, 0, -0.207911792), z_dir=(0.207911792, 0, 0.978147579))):
        with Locations((-1.750809729, 35.06)):
            Circle(BUTTON_CIRCLE_R)
    extrude(amount=BOSS_EXTRUDE_BUTTON_DEPTH)


with BuildPart() as body_2_2:
    # PCB components<8> → Boss-Extrude power switch (new body)
    with BuildSketch(Plane(origin=(0, 0, 0), x_dir=(1, 0, 0), z_dir=(0, 1, 0)).offset(BOSS_EXTRUDE_START_6)):
        Polygon((-7.537655758, -51.90741924), (-11.725118165, -51.244190443), (-12.394248337, -55.593057189), (-8.22596731, -56.253247953), align=None)
    extrude(amount=BOSS_EXTRUDE_POWER_SWITCH_DEPTH)


solid = Compound([part_1.part, body_2_2.part])
